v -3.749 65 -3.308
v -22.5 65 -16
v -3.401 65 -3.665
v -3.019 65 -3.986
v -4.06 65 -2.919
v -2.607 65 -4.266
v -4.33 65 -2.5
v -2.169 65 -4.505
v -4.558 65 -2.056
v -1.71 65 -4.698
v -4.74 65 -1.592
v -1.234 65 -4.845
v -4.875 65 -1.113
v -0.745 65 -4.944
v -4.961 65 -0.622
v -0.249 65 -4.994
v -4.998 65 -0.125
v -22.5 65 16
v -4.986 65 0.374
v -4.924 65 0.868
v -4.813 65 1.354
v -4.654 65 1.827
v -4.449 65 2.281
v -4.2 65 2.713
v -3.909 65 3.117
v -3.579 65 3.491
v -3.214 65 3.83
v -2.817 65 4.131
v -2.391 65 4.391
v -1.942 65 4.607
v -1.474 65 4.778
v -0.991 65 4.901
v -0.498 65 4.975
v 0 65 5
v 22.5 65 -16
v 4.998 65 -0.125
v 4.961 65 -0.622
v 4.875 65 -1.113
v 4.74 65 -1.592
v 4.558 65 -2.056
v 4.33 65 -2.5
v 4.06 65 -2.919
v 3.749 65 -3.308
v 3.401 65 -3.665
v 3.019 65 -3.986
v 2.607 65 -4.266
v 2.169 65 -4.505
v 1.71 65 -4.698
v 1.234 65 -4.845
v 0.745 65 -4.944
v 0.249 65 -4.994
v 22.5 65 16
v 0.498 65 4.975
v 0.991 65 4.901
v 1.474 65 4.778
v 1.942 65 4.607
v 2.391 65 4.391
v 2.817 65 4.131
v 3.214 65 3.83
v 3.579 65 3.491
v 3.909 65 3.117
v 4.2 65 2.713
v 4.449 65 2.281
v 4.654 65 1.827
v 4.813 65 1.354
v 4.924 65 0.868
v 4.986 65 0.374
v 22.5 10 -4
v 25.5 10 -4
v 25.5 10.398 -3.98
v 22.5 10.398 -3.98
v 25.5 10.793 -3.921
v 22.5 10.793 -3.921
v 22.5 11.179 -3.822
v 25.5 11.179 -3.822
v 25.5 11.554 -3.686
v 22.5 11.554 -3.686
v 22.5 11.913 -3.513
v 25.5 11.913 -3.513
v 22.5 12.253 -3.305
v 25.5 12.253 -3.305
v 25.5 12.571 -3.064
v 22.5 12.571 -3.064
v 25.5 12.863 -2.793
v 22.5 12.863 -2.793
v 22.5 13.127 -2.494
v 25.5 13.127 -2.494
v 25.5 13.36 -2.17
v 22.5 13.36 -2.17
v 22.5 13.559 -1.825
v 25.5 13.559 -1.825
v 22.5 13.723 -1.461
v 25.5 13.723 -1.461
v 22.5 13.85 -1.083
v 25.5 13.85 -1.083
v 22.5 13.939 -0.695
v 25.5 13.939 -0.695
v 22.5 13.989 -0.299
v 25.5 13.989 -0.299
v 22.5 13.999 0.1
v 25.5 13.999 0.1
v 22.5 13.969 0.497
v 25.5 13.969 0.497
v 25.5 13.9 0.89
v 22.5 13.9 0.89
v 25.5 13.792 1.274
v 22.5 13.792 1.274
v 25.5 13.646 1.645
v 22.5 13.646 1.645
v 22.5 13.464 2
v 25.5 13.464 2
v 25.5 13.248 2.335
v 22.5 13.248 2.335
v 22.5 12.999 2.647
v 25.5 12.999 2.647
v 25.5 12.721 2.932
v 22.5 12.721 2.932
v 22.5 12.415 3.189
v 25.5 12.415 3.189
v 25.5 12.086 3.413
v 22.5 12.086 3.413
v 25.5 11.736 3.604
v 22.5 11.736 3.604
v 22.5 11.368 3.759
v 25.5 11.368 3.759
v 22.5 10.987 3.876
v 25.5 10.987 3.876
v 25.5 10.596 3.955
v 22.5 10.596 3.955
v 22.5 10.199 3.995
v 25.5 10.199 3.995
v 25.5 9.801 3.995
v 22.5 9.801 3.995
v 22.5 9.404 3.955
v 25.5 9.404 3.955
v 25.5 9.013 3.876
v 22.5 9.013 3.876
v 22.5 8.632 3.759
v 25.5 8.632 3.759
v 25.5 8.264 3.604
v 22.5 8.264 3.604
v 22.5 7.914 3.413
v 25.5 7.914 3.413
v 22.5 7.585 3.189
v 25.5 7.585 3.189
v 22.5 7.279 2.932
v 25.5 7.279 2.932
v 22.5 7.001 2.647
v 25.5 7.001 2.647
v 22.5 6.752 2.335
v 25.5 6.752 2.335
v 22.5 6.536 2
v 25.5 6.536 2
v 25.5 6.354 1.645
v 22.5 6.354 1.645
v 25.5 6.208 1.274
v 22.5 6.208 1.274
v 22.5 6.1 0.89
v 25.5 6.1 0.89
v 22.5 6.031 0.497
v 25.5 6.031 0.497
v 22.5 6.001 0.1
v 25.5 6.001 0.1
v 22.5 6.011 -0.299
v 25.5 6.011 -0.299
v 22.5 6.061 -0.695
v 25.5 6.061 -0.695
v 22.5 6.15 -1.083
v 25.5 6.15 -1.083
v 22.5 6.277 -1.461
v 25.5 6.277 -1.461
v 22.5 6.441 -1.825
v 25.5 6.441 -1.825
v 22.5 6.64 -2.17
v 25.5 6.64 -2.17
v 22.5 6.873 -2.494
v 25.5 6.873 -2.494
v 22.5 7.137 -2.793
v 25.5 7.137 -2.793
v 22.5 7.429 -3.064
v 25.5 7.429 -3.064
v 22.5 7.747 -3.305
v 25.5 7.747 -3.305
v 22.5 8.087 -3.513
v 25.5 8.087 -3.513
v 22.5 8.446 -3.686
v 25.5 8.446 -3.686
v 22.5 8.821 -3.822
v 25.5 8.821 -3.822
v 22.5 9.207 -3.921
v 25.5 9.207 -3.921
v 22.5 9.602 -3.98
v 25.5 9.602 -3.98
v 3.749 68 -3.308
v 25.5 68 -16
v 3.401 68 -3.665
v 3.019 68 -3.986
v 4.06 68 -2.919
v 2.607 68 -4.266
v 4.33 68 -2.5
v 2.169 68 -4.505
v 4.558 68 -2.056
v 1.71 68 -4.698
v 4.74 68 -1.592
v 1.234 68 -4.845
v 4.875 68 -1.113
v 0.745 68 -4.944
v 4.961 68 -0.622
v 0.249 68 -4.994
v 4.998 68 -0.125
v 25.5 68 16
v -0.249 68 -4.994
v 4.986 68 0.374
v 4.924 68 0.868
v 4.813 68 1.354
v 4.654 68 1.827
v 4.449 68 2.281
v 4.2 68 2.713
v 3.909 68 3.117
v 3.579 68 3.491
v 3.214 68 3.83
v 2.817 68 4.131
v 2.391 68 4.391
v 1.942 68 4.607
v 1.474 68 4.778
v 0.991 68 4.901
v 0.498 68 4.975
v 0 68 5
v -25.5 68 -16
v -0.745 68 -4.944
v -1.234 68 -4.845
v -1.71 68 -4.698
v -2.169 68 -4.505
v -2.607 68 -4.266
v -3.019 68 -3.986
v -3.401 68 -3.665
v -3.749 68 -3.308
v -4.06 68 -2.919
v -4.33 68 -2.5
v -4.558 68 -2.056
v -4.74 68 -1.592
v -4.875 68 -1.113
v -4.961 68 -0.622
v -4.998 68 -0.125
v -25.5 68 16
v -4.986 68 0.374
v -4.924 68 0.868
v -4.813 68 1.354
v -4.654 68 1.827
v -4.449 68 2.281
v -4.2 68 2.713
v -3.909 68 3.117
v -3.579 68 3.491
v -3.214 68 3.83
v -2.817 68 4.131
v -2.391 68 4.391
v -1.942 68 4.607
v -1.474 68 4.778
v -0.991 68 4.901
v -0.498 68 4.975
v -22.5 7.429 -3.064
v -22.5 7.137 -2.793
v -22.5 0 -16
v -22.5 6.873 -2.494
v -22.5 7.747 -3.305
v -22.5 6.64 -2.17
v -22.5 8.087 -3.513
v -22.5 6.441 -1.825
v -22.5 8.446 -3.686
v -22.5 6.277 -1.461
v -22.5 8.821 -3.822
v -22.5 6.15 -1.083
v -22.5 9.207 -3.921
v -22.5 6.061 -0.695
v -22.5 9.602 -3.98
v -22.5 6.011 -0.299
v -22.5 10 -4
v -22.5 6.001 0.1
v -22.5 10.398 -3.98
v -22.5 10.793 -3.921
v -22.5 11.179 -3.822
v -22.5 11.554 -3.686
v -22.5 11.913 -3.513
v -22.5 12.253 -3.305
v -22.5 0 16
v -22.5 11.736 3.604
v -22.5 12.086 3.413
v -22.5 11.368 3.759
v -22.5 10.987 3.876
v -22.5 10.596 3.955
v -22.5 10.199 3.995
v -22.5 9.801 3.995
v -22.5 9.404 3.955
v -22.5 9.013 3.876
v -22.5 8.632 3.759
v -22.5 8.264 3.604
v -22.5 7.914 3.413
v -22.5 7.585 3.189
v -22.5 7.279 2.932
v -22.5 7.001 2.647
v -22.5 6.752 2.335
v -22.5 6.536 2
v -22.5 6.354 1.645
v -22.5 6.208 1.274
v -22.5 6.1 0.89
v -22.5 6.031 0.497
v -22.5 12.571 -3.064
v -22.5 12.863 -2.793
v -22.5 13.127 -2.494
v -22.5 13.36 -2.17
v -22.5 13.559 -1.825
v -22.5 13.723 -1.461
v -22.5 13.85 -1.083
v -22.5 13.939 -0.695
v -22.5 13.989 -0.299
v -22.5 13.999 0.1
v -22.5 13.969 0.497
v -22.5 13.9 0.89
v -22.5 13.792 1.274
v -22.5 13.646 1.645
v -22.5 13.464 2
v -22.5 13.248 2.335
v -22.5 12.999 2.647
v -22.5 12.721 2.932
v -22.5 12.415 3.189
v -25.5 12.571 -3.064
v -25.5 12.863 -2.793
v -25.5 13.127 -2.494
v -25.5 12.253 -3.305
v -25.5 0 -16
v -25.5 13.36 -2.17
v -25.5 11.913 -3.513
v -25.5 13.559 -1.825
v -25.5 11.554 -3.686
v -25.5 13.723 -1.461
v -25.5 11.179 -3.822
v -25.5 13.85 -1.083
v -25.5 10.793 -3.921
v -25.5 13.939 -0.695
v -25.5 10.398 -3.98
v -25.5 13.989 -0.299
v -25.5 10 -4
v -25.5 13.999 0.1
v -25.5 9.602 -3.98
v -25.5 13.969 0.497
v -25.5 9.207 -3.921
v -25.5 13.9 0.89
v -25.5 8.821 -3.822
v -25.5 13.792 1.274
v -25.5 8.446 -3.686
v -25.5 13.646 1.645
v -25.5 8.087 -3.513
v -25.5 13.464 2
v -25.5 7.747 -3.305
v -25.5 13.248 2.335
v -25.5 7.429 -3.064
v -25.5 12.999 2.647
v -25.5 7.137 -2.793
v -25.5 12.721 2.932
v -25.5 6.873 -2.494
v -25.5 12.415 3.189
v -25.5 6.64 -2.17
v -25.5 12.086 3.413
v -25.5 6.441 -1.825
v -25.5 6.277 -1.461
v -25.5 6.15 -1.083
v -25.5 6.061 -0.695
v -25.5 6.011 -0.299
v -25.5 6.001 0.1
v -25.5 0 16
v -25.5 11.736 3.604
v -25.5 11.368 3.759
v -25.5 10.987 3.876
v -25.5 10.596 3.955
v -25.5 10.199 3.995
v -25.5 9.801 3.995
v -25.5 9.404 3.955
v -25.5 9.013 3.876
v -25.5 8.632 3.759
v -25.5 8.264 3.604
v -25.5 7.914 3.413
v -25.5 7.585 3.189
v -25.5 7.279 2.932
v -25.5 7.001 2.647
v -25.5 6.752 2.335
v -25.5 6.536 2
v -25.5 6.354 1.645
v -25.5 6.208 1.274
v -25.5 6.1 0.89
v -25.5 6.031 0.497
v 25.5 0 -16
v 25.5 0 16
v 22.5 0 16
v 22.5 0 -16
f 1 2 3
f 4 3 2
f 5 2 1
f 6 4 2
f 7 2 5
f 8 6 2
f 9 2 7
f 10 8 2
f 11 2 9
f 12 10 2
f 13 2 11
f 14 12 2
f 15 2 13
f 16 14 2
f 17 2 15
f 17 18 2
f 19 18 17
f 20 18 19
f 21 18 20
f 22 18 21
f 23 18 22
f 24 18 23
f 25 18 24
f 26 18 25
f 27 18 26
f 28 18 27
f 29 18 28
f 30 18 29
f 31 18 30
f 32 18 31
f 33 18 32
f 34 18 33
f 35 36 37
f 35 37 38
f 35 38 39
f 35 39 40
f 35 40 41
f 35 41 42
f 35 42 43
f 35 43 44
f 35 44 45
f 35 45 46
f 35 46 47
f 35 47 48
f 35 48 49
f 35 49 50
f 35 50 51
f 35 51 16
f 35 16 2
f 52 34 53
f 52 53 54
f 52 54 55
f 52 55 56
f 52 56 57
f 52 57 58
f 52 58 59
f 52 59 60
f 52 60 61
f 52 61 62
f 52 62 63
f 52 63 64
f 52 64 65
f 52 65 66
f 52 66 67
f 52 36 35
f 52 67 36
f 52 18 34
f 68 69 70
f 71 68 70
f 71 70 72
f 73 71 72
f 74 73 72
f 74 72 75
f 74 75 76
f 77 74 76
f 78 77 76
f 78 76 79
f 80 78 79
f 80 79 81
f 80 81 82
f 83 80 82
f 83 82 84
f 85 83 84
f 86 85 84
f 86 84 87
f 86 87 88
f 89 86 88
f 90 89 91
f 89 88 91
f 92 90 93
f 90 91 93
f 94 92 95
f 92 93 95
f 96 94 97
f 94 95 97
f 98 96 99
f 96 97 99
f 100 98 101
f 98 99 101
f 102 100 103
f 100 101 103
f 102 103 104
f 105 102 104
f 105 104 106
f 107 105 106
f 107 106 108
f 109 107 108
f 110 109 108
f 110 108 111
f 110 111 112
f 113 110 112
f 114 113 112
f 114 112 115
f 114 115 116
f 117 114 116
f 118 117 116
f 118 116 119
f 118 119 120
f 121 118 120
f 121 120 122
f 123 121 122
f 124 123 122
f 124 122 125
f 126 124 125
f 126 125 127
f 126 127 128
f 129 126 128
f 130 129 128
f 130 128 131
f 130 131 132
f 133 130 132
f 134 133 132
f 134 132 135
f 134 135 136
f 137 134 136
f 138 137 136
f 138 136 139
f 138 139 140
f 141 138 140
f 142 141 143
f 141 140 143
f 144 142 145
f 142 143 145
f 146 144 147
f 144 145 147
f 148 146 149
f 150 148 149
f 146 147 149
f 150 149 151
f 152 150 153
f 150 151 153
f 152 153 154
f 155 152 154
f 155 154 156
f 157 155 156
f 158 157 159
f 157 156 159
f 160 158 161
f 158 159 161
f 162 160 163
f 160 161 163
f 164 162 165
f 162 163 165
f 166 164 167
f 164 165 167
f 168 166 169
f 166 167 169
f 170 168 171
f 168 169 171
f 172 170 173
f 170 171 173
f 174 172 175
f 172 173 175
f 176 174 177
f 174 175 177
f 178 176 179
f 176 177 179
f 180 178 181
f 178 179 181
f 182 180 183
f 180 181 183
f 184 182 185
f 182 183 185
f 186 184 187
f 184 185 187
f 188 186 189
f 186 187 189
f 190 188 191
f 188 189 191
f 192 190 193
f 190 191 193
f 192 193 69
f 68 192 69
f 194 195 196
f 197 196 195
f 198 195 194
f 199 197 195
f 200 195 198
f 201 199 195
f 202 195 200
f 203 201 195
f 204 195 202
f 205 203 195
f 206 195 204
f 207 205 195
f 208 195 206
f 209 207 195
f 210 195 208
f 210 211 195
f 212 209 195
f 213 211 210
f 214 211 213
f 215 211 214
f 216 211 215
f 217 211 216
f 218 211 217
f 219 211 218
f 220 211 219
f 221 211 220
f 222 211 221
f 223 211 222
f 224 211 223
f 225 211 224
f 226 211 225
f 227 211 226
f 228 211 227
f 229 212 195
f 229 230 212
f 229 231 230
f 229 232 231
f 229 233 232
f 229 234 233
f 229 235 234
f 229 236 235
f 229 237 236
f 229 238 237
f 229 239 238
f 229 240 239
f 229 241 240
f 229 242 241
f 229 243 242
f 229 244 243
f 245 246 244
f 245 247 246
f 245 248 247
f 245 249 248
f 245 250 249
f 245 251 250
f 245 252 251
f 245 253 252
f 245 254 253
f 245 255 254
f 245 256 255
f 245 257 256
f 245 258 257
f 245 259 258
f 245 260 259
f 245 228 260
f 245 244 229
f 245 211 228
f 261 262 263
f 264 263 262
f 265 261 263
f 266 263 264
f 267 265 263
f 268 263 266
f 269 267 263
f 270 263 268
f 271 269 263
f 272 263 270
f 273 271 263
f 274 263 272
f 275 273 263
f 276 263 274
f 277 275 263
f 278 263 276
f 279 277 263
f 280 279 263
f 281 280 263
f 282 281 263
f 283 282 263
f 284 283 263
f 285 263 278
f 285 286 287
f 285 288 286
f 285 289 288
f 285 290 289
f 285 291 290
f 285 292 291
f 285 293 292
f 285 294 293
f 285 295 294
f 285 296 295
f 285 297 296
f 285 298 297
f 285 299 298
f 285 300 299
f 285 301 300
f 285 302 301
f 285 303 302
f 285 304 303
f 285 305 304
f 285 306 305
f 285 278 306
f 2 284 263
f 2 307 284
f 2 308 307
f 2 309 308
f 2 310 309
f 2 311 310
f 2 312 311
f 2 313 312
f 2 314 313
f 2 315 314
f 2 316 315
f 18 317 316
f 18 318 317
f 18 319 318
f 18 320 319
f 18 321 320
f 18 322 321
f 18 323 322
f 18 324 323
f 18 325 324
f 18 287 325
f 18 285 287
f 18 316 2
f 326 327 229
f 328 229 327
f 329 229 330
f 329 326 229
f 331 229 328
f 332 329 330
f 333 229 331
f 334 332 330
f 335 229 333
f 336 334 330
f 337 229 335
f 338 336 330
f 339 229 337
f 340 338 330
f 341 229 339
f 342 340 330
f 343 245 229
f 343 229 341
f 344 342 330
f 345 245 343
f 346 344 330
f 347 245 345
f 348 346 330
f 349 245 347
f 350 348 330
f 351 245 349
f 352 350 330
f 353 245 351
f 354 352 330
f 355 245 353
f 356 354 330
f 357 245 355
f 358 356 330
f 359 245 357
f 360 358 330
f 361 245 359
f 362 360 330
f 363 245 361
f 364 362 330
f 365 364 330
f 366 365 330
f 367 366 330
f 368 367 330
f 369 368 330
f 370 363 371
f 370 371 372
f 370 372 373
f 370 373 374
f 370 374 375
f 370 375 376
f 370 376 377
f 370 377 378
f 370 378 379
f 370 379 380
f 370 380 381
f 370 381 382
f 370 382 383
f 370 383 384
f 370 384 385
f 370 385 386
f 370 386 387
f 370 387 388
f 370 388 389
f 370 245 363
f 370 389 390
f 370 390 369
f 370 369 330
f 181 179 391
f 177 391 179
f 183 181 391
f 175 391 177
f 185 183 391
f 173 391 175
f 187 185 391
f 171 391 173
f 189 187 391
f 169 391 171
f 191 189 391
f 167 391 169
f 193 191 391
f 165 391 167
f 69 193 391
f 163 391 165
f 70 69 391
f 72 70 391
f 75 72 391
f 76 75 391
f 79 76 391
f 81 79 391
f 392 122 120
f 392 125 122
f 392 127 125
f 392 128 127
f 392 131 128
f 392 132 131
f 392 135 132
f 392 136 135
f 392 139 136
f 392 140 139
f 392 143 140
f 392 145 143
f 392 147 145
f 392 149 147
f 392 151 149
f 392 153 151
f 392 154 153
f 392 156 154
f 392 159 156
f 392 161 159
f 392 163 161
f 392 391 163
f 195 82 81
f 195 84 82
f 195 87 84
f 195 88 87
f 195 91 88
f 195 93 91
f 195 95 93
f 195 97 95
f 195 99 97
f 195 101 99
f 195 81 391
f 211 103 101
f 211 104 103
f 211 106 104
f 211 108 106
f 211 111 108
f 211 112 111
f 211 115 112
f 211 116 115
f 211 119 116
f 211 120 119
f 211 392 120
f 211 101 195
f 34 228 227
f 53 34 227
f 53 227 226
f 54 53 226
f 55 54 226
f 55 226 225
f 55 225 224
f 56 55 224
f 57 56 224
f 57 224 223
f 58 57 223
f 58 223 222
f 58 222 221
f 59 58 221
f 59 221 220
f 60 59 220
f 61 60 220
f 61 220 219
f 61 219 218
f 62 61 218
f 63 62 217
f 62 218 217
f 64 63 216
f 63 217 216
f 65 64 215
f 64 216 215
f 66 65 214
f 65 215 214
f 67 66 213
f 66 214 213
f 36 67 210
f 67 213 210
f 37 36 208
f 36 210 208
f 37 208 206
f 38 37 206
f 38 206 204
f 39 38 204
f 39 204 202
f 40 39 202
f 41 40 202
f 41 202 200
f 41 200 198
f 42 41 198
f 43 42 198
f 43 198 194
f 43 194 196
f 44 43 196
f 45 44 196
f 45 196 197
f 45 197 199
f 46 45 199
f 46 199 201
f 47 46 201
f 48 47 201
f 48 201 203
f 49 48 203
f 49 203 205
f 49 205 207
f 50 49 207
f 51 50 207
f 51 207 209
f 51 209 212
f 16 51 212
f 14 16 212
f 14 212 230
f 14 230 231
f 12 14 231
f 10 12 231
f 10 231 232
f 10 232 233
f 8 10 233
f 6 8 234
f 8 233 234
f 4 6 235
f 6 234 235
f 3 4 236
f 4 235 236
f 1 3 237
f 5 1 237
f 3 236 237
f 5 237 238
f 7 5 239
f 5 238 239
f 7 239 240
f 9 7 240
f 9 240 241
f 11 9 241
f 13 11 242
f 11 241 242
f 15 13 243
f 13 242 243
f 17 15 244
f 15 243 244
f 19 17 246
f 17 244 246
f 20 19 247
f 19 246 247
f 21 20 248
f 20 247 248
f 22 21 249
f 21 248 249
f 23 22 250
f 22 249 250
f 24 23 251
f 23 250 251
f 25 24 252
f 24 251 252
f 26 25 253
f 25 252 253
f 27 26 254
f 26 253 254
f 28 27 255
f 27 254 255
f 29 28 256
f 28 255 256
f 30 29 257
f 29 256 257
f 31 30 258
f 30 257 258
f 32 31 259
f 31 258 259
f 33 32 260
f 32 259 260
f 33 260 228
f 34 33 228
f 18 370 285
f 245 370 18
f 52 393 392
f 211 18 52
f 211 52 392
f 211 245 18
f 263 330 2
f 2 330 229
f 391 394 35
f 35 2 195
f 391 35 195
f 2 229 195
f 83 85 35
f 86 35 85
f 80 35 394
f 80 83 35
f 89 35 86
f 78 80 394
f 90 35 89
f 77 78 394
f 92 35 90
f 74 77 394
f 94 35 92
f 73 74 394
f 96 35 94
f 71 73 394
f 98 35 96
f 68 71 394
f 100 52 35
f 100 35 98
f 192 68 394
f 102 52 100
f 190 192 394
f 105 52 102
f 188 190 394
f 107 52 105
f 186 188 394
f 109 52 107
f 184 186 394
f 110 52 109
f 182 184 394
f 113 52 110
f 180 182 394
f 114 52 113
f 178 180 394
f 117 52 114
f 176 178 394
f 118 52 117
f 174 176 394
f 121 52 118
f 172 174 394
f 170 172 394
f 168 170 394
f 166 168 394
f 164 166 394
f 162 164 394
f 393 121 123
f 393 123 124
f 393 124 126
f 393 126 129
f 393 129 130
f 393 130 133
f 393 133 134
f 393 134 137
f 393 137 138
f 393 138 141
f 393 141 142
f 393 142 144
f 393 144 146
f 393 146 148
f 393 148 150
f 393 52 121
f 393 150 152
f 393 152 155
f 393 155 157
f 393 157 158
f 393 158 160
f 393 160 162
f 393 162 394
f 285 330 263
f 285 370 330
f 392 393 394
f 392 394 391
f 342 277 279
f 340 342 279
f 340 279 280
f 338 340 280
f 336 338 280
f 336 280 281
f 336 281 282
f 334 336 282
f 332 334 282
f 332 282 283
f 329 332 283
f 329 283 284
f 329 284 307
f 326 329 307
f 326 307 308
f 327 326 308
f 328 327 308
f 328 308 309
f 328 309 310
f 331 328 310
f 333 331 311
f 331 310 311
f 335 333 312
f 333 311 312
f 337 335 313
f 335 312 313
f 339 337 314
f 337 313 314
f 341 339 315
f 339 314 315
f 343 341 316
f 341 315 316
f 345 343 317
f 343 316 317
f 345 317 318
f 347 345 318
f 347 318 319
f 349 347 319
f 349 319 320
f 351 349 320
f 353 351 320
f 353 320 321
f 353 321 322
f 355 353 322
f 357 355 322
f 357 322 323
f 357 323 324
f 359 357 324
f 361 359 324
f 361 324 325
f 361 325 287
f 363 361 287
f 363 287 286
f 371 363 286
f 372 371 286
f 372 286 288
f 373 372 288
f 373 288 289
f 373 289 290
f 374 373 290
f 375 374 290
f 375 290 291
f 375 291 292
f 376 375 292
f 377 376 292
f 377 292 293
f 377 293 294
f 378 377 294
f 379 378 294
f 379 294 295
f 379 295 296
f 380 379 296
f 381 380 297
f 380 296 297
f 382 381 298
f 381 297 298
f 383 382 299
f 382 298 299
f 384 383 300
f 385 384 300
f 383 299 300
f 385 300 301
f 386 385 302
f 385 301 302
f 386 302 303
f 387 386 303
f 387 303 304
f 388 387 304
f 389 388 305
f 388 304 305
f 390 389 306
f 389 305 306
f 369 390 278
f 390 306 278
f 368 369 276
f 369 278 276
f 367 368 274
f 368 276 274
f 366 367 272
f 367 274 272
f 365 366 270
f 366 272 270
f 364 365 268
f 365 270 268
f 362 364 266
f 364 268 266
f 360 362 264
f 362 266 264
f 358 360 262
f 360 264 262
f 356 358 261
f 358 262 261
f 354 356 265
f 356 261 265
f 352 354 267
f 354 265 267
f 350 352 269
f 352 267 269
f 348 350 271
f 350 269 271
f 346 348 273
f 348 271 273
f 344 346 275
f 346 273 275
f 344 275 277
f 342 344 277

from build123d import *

# Parameters (mm, degrees)
BOSS_EXTRUDE1_DEPTH = 16
SKETCH2_R           = 4
CUT_EXTRUDE1_DEPTH  = 87.492774265
SKETCH3_R           = 5
CUT_EXTRUDE2_DEPTH  = 32


with BuildPart() as part:
    # Sketch1 → Boss-Extrude1 (new, symmetric)
    with BuildSketch(Plane.XY):
        Polygon((-22.5, 0), (-22.5, 65), (22.5, 65), (22.5, 0), (25.5, 0), (25.5, 68), (-25.5, 68), (-25.5, 0), align=None)
    extrude(amount=BOSS_EXTRUDE1_DEPTH, both=True)

    # Sketch2 → Cut-Extrude1 (cut, through all)
    with BuildSketch(Plane(origin=(25.5, 0, 0), x_dir=(0, 0, -1), z_dir=(1, 0, 0))):
        with Locations((0, 10)):
            Circle(SKETCH2_R)
    extrude(amount=-CUT_EXTRUDE1_DEPTH, mode=Mode.SUBTRACT)

    # Sketch3 → Cut-Extrude2 (cut)
    with BuildSketch(Plane(origin=(0, 68, 0), x_dir=(1, 0, 0), z_dir=(0, 1, 0))):
        with Locations(Location((0, 0, 0), (0, 0, 270))):
            Circle(SKETCH3_R)
    extrude(amount=-CUT_EXTRUDE2_DEPTH, mode=Mode.SUBTRACT)


solid = part.part
